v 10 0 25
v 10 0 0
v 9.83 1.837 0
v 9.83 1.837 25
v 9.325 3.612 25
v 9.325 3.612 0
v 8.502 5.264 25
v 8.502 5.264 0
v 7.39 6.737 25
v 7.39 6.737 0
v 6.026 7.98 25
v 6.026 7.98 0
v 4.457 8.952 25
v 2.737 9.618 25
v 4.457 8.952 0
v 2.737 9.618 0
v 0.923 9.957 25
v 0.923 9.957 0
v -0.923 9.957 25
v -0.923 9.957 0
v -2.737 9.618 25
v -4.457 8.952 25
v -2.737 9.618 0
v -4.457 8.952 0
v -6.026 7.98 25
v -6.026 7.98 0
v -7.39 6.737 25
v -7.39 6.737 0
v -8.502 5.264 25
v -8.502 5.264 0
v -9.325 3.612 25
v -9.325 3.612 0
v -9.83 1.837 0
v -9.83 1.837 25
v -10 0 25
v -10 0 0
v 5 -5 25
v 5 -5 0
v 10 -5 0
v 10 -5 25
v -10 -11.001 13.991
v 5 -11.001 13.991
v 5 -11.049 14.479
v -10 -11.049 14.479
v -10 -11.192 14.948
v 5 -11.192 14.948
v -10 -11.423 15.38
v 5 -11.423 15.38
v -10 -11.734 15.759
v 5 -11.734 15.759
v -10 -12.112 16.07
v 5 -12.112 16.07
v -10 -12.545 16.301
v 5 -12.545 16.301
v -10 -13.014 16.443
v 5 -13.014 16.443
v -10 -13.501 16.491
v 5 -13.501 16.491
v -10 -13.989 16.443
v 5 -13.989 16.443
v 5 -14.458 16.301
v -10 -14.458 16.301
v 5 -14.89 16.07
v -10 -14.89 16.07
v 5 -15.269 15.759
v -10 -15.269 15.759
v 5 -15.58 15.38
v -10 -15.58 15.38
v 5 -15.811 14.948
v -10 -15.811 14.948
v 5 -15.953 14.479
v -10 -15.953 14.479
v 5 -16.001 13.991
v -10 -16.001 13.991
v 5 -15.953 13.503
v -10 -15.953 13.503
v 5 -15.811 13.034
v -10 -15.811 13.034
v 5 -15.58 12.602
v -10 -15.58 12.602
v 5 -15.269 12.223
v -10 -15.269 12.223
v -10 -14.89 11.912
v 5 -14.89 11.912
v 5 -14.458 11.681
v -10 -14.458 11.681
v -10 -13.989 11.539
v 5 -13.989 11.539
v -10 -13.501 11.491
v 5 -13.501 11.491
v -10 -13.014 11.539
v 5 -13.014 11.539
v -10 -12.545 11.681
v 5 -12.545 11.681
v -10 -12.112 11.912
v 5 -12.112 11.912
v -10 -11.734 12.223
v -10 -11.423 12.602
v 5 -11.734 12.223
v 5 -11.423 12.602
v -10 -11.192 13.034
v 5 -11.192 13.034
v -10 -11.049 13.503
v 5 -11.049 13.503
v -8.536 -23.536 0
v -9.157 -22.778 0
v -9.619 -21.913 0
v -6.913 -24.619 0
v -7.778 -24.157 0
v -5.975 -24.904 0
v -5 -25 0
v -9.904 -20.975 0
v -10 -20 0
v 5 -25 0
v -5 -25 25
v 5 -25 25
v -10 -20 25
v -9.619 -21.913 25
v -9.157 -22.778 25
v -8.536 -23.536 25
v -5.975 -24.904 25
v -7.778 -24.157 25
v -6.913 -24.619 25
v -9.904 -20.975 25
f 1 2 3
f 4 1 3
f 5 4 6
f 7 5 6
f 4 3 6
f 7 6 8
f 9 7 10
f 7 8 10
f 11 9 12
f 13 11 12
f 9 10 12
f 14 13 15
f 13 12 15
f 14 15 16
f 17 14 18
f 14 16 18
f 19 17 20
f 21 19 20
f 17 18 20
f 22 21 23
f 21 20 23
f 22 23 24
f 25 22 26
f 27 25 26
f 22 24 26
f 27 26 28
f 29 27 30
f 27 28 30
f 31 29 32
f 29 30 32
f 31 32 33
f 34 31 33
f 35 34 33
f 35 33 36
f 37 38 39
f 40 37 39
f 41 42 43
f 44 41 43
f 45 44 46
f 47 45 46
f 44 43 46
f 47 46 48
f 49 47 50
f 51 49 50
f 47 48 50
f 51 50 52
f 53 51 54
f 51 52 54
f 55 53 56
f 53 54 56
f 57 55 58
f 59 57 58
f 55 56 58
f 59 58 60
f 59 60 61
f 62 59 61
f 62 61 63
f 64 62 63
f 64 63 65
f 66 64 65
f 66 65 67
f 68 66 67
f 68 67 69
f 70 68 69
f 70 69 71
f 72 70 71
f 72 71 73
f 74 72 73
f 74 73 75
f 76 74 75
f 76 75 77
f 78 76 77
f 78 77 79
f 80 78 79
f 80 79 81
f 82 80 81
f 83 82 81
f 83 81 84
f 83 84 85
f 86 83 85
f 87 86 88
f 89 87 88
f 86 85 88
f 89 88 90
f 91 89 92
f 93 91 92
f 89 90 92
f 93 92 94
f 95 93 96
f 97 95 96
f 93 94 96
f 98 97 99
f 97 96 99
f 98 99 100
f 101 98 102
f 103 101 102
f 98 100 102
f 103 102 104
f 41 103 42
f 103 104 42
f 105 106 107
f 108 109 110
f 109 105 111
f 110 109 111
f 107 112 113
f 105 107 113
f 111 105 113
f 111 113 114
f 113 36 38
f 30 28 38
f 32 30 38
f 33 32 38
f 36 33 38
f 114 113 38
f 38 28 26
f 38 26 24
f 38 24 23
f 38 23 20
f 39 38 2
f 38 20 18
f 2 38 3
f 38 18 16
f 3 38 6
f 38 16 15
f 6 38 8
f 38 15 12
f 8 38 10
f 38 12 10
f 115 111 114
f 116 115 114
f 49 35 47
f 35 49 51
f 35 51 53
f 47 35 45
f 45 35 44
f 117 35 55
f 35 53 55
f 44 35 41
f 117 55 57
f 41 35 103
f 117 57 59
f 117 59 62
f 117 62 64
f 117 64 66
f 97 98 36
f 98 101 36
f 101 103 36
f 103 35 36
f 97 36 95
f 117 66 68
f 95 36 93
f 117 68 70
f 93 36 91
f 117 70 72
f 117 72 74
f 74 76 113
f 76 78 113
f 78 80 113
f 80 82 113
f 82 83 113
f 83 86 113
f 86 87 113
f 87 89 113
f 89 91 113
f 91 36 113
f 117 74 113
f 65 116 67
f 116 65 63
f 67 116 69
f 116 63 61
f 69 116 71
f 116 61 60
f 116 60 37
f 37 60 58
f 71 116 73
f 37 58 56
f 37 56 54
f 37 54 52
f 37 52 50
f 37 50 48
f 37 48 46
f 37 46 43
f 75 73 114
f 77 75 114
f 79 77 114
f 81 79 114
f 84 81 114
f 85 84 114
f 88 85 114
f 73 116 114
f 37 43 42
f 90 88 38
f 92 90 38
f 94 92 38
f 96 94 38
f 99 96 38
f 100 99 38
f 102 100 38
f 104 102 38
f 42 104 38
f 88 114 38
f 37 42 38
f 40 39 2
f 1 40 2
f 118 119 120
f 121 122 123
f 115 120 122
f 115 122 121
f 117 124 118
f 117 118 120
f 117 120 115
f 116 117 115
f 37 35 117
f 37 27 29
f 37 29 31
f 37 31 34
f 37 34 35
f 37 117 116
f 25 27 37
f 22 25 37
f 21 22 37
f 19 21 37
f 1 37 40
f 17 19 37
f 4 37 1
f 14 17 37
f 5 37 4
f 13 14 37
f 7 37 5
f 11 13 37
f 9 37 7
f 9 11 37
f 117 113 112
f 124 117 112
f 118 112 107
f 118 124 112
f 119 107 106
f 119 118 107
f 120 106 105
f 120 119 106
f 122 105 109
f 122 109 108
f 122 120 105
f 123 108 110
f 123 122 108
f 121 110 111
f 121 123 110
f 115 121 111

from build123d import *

# Parameters (mm, degrees)
F1_DEPTH = 25
F3_D     = 5
F4_R     = 5


with BuildPart() as f1:
    # F0 (on Top) → F1 (new body)
    with BuildSketch(Plane.XY):
        with BuildLine():
            Line((10, -5), (10, 0))
            ThreePointArc((10, 0), (0, 10), (-10, 0))
            Line((-10, 0), (-10, -25))
            Line((-10, -25), (5, -25))
            Line((5, -25), (5, -5))
            Line((5, -5), (10, -5))
        make_face()
    extrude(amount=F1_DEPTH)

    # F3 (through all)
    with Locations(Plane(origin=(-10, 0, 0), x_dir=(0, -1, 0), z_dir=(-1, 0, 0))):
        with Locations((13.501376, 13.991057)):
            Hole(F3_D / 2)

    # F4
    f4_edges = [f1.edges().sort_by_distance(p)[0] for p in [
        (-10, -25, 12.5),
    ]]
    fillet(f4_edges, radius=F4_R)


solid = f1.part
